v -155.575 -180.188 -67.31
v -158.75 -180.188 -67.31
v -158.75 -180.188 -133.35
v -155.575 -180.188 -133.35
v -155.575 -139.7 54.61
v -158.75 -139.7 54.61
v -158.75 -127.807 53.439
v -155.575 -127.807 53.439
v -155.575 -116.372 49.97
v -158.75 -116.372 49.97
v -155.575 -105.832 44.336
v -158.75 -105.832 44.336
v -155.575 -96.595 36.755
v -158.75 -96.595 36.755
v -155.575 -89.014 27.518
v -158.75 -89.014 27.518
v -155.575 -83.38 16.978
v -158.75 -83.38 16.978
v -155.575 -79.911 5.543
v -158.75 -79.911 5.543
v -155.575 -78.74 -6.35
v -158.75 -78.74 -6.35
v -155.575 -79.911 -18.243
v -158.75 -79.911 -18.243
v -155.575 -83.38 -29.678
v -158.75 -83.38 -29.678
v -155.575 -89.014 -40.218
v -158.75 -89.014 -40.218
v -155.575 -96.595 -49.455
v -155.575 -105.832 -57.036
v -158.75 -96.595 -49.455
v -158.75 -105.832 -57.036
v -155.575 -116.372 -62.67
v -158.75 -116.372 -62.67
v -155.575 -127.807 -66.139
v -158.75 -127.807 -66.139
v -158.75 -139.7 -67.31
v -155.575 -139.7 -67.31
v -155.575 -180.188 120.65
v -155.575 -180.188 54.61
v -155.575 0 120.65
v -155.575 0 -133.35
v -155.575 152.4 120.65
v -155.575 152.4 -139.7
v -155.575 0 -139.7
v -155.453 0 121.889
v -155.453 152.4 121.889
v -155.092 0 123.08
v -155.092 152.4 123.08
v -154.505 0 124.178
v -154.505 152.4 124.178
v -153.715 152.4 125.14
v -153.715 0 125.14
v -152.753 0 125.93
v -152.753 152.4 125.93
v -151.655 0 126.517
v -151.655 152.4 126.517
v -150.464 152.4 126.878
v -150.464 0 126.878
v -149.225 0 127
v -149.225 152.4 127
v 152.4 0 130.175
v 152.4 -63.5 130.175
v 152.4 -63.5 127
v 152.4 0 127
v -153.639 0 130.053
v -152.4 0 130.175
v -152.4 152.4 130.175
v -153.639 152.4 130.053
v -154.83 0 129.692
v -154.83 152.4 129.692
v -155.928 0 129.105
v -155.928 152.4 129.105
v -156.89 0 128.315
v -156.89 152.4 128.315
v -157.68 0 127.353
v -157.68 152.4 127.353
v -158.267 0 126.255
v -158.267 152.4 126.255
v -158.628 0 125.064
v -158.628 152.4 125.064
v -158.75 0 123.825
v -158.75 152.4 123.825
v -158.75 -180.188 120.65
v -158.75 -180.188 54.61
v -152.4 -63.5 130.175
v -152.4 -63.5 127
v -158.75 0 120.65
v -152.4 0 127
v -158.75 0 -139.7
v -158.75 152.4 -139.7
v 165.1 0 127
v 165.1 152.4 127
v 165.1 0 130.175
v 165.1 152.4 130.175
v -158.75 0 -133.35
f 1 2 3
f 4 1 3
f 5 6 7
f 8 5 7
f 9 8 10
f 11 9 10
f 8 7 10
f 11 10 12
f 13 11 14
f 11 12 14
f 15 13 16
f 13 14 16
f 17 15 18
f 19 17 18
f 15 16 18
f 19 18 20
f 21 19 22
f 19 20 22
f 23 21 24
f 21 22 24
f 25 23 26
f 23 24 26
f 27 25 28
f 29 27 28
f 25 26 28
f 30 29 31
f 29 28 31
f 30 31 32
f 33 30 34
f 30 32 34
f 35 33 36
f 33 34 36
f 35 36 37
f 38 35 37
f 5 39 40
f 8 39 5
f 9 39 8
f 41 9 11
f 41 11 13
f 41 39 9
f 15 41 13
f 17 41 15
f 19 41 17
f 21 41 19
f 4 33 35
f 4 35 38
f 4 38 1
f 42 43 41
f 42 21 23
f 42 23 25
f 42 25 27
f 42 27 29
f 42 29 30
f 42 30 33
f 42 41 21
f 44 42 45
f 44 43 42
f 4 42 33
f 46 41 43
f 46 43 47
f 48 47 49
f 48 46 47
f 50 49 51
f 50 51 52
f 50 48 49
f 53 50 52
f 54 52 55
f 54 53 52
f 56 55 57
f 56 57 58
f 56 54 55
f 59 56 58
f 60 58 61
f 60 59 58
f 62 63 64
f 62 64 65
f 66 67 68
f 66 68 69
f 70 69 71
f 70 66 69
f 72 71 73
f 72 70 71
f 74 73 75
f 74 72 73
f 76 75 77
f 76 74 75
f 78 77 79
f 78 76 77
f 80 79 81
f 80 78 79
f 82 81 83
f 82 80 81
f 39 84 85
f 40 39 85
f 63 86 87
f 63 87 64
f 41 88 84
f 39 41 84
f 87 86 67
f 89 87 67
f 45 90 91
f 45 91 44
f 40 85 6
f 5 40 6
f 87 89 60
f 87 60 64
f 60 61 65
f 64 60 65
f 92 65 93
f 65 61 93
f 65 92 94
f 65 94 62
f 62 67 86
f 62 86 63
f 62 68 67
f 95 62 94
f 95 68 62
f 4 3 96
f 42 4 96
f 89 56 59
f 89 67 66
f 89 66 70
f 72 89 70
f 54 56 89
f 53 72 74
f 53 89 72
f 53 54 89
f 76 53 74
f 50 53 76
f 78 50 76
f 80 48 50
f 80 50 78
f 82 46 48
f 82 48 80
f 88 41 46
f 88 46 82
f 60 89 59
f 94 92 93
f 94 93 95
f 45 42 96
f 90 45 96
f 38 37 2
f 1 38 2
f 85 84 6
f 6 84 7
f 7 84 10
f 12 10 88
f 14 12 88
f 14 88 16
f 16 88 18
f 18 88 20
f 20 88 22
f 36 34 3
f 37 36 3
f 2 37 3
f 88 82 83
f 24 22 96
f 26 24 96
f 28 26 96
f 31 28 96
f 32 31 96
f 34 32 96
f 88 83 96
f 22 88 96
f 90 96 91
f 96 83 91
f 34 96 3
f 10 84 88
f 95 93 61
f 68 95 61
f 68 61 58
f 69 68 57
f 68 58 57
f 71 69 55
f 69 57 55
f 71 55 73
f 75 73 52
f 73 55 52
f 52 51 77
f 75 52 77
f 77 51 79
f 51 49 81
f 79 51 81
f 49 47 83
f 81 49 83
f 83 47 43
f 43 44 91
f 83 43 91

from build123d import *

# Parameters (mm, degrees)
BOSS_EXTRUDE2_DEPTH = 152.4
SKETCH5_W           = 304.8
SKETCH5_H           = 63.5
BOSS_EXTRUDE3_DEPTH = 3.175
BOSS_EXTRUDE4_DEPTH = 3.175


with BuildPart() as part:
    # Sketch4 → Boss-Extrude2 (new body)
    with BuildSketch(Plane(origin=(0, 0, 0), x_dir=(1, 0, 0), z_dir=(0, 1, 0))):
        with BuildLine():
            Line((-149.225, -127), (165.1, -127))
            Line((165.1, -127), (165.1, -130.175))
            Line((165.1, -130.175), (-152.4, -130.175))
            ThreePointArc((-152.4, -130.175), (-156.890128061, -128.315128061), (-158.75, -123.825))
            Line((-158.75, -123.825), (-158.75, 139.7))
            Line((-158.75, 139.7), (-155.575, 139.7))
            Line((-155.575, 139.7), (-155.575, -120.65))
            ThreePointArc((-155.575, -120.65), (-153.715128061, -125.140128061), (-149.225, -127))
        make_face()
    extrude(amount=BOSS_EXTRUDE2_DEPTH)

    # Sketch5 → Boss-Extrude3 (add)
    with BuildSketch(Plane.XY.offset(130.175)):
        with Locations((0, -31.75)):
            Rectangle(SKETCH5_W, SKETCH5_H)
    extrude(amount=-BOSS_EXTRUDE3_DEPTH)

    # Sketch6 → Boss-Extrude4 (add)
    with BuildSketch(Plane.ZY.offset(158.75)):
        with BuildLine():
            Line((-133.35, -180.1876), (-133.35, 0))
            Line((-133.35, 0), (120.65, 0))
            Line((120.65, 0), (120.65, -180.1876))
            Line((120.65, -180.1876), (54.61, -180.1876))
            Line((54.61, -180.1876), (54.61, -139.7))
            ThreePointArc((54.61, -139.7), (-6.35, -78.74), (-67.31, -139.7))
            Line((-67.31, -139.7), (-67.31, -180.1876))
            Line((-67.31, -180.1876), (-133.35, -180.1876))
        make_face()
    extrude(amount=-BOSS_EXTRUDE4_DEPTH)


solid = part.part
